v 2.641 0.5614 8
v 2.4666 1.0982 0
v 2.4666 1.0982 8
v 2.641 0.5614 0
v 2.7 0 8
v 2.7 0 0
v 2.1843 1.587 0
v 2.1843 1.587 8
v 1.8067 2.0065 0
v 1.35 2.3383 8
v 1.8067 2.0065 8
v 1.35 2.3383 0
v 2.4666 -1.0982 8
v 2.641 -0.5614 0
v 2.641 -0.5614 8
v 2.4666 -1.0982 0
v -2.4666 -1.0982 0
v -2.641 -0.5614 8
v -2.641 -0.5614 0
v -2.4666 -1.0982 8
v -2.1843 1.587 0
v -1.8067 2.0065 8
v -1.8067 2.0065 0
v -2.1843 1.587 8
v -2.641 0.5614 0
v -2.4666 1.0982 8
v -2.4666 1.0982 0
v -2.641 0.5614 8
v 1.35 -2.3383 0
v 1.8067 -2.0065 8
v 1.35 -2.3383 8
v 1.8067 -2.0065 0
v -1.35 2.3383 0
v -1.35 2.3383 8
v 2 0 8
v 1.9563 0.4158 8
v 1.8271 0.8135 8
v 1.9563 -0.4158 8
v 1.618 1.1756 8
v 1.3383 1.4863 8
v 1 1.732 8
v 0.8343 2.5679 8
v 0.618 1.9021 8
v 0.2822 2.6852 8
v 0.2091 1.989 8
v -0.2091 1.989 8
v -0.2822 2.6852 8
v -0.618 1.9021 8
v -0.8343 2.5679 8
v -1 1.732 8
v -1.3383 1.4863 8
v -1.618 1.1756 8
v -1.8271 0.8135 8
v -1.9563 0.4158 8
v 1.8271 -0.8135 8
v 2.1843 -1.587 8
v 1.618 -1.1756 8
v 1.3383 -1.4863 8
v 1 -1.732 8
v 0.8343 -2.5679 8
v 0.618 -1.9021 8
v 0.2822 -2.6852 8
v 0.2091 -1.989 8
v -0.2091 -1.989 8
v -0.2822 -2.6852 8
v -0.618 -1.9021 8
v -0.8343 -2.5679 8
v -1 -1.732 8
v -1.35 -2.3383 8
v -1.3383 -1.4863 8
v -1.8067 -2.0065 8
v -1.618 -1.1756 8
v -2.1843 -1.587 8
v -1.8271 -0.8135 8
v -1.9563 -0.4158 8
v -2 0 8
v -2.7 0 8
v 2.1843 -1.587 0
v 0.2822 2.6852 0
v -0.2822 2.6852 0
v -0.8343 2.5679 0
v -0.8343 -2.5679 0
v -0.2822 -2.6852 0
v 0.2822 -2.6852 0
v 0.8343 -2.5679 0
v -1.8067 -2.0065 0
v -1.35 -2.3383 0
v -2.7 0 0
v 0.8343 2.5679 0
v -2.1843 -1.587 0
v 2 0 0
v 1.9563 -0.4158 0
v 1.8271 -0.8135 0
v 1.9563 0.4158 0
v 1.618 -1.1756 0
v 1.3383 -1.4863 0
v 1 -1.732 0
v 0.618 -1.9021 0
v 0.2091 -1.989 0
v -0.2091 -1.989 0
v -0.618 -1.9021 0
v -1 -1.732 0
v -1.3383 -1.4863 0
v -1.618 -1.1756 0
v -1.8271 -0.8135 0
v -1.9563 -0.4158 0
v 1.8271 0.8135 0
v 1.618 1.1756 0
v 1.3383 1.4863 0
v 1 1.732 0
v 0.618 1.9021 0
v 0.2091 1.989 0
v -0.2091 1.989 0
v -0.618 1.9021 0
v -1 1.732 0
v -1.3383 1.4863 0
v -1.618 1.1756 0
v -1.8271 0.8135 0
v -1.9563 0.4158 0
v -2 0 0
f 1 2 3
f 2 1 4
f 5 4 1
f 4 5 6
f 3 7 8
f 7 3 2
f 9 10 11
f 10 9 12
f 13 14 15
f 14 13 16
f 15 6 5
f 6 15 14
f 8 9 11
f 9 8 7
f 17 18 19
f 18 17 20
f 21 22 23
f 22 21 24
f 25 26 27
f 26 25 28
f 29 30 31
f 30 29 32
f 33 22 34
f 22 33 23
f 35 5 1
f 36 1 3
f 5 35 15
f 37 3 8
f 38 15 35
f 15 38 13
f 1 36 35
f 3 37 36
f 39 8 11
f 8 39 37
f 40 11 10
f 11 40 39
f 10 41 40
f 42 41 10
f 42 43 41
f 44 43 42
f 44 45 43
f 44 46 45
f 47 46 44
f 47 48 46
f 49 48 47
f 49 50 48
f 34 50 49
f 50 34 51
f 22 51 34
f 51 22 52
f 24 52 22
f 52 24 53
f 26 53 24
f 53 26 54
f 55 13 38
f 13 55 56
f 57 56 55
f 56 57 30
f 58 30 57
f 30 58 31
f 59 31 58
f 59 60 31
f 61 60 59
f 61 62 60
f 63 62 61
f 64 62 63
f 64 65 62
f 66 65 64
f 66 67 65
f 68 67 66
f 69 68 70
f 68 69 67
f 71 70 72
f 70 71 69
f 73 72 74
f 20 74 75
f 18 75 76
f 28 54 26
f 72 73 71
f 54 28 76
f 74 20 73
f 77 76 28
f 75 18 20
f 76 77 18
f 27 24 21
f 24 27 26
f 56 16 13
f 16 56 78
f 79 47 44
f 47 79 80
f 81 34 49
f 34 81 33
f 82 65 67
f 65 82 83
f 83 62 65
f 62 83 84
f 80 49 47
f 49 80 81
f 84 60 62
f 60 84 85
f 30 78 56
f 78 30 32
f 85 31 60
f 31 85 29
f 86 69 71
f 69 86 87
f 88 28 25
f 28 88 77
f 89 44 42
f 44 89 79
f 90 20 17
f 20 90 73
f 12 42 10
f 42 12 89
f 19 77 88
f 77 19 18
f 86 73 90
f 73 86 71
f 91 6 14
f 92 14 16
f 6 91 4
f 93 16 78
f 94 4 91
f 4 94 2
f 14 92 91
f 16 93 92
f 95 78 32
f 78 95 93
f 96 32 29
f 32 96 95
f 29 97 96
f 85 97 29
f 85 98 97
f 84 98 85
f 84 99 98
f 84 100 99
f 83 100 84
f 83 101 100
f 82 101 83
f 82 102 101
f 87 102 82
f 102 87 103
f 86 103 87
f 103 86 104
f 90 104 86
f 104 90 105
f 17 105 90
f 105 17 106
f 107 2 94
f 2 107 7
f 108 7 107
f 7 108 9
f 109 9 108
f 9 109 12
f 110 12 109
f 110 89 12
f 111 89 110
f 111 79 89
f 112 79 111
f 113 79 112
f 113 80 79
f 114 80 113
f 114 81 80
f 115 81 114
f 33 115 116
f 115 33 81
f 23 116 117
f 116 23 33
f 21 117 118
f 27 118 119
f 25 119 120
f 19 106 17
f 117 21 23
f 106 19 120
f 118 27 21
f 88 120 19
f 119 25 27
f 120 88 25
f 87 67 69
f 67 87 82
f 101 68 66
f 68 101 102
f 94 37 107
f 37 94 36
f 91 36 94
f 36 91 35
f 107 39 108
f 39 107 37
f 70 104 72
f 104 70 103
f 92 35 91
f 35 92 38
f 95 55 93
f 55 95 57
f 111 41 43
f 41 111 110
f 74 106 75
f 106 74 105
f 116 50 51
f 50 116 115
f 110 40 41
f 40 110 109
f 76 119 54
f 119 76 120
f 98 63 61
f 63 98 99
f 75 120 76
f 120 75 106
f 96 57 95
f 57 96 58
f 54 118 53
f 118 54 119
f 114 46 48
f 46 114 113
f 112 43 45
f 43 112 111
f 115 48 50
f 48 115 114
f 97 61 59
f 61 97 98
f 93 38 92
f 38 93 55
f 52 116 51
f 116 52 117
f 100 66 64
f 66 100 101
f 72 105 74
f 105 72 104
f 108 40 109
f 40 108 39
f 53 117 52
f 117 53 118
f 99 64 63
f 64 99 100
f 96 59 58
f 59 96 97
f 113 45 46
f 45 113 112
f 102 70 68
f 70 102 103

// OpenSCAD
H = 8;
// H = 37.5 - 20 // with 10mm spacer
difference(){
  cylinder(h=H, d=4 + 1.4, $fn=30);
  translate([0, 0, -1])cylinder(h=H + 2, d=4, $fn=30);
}
